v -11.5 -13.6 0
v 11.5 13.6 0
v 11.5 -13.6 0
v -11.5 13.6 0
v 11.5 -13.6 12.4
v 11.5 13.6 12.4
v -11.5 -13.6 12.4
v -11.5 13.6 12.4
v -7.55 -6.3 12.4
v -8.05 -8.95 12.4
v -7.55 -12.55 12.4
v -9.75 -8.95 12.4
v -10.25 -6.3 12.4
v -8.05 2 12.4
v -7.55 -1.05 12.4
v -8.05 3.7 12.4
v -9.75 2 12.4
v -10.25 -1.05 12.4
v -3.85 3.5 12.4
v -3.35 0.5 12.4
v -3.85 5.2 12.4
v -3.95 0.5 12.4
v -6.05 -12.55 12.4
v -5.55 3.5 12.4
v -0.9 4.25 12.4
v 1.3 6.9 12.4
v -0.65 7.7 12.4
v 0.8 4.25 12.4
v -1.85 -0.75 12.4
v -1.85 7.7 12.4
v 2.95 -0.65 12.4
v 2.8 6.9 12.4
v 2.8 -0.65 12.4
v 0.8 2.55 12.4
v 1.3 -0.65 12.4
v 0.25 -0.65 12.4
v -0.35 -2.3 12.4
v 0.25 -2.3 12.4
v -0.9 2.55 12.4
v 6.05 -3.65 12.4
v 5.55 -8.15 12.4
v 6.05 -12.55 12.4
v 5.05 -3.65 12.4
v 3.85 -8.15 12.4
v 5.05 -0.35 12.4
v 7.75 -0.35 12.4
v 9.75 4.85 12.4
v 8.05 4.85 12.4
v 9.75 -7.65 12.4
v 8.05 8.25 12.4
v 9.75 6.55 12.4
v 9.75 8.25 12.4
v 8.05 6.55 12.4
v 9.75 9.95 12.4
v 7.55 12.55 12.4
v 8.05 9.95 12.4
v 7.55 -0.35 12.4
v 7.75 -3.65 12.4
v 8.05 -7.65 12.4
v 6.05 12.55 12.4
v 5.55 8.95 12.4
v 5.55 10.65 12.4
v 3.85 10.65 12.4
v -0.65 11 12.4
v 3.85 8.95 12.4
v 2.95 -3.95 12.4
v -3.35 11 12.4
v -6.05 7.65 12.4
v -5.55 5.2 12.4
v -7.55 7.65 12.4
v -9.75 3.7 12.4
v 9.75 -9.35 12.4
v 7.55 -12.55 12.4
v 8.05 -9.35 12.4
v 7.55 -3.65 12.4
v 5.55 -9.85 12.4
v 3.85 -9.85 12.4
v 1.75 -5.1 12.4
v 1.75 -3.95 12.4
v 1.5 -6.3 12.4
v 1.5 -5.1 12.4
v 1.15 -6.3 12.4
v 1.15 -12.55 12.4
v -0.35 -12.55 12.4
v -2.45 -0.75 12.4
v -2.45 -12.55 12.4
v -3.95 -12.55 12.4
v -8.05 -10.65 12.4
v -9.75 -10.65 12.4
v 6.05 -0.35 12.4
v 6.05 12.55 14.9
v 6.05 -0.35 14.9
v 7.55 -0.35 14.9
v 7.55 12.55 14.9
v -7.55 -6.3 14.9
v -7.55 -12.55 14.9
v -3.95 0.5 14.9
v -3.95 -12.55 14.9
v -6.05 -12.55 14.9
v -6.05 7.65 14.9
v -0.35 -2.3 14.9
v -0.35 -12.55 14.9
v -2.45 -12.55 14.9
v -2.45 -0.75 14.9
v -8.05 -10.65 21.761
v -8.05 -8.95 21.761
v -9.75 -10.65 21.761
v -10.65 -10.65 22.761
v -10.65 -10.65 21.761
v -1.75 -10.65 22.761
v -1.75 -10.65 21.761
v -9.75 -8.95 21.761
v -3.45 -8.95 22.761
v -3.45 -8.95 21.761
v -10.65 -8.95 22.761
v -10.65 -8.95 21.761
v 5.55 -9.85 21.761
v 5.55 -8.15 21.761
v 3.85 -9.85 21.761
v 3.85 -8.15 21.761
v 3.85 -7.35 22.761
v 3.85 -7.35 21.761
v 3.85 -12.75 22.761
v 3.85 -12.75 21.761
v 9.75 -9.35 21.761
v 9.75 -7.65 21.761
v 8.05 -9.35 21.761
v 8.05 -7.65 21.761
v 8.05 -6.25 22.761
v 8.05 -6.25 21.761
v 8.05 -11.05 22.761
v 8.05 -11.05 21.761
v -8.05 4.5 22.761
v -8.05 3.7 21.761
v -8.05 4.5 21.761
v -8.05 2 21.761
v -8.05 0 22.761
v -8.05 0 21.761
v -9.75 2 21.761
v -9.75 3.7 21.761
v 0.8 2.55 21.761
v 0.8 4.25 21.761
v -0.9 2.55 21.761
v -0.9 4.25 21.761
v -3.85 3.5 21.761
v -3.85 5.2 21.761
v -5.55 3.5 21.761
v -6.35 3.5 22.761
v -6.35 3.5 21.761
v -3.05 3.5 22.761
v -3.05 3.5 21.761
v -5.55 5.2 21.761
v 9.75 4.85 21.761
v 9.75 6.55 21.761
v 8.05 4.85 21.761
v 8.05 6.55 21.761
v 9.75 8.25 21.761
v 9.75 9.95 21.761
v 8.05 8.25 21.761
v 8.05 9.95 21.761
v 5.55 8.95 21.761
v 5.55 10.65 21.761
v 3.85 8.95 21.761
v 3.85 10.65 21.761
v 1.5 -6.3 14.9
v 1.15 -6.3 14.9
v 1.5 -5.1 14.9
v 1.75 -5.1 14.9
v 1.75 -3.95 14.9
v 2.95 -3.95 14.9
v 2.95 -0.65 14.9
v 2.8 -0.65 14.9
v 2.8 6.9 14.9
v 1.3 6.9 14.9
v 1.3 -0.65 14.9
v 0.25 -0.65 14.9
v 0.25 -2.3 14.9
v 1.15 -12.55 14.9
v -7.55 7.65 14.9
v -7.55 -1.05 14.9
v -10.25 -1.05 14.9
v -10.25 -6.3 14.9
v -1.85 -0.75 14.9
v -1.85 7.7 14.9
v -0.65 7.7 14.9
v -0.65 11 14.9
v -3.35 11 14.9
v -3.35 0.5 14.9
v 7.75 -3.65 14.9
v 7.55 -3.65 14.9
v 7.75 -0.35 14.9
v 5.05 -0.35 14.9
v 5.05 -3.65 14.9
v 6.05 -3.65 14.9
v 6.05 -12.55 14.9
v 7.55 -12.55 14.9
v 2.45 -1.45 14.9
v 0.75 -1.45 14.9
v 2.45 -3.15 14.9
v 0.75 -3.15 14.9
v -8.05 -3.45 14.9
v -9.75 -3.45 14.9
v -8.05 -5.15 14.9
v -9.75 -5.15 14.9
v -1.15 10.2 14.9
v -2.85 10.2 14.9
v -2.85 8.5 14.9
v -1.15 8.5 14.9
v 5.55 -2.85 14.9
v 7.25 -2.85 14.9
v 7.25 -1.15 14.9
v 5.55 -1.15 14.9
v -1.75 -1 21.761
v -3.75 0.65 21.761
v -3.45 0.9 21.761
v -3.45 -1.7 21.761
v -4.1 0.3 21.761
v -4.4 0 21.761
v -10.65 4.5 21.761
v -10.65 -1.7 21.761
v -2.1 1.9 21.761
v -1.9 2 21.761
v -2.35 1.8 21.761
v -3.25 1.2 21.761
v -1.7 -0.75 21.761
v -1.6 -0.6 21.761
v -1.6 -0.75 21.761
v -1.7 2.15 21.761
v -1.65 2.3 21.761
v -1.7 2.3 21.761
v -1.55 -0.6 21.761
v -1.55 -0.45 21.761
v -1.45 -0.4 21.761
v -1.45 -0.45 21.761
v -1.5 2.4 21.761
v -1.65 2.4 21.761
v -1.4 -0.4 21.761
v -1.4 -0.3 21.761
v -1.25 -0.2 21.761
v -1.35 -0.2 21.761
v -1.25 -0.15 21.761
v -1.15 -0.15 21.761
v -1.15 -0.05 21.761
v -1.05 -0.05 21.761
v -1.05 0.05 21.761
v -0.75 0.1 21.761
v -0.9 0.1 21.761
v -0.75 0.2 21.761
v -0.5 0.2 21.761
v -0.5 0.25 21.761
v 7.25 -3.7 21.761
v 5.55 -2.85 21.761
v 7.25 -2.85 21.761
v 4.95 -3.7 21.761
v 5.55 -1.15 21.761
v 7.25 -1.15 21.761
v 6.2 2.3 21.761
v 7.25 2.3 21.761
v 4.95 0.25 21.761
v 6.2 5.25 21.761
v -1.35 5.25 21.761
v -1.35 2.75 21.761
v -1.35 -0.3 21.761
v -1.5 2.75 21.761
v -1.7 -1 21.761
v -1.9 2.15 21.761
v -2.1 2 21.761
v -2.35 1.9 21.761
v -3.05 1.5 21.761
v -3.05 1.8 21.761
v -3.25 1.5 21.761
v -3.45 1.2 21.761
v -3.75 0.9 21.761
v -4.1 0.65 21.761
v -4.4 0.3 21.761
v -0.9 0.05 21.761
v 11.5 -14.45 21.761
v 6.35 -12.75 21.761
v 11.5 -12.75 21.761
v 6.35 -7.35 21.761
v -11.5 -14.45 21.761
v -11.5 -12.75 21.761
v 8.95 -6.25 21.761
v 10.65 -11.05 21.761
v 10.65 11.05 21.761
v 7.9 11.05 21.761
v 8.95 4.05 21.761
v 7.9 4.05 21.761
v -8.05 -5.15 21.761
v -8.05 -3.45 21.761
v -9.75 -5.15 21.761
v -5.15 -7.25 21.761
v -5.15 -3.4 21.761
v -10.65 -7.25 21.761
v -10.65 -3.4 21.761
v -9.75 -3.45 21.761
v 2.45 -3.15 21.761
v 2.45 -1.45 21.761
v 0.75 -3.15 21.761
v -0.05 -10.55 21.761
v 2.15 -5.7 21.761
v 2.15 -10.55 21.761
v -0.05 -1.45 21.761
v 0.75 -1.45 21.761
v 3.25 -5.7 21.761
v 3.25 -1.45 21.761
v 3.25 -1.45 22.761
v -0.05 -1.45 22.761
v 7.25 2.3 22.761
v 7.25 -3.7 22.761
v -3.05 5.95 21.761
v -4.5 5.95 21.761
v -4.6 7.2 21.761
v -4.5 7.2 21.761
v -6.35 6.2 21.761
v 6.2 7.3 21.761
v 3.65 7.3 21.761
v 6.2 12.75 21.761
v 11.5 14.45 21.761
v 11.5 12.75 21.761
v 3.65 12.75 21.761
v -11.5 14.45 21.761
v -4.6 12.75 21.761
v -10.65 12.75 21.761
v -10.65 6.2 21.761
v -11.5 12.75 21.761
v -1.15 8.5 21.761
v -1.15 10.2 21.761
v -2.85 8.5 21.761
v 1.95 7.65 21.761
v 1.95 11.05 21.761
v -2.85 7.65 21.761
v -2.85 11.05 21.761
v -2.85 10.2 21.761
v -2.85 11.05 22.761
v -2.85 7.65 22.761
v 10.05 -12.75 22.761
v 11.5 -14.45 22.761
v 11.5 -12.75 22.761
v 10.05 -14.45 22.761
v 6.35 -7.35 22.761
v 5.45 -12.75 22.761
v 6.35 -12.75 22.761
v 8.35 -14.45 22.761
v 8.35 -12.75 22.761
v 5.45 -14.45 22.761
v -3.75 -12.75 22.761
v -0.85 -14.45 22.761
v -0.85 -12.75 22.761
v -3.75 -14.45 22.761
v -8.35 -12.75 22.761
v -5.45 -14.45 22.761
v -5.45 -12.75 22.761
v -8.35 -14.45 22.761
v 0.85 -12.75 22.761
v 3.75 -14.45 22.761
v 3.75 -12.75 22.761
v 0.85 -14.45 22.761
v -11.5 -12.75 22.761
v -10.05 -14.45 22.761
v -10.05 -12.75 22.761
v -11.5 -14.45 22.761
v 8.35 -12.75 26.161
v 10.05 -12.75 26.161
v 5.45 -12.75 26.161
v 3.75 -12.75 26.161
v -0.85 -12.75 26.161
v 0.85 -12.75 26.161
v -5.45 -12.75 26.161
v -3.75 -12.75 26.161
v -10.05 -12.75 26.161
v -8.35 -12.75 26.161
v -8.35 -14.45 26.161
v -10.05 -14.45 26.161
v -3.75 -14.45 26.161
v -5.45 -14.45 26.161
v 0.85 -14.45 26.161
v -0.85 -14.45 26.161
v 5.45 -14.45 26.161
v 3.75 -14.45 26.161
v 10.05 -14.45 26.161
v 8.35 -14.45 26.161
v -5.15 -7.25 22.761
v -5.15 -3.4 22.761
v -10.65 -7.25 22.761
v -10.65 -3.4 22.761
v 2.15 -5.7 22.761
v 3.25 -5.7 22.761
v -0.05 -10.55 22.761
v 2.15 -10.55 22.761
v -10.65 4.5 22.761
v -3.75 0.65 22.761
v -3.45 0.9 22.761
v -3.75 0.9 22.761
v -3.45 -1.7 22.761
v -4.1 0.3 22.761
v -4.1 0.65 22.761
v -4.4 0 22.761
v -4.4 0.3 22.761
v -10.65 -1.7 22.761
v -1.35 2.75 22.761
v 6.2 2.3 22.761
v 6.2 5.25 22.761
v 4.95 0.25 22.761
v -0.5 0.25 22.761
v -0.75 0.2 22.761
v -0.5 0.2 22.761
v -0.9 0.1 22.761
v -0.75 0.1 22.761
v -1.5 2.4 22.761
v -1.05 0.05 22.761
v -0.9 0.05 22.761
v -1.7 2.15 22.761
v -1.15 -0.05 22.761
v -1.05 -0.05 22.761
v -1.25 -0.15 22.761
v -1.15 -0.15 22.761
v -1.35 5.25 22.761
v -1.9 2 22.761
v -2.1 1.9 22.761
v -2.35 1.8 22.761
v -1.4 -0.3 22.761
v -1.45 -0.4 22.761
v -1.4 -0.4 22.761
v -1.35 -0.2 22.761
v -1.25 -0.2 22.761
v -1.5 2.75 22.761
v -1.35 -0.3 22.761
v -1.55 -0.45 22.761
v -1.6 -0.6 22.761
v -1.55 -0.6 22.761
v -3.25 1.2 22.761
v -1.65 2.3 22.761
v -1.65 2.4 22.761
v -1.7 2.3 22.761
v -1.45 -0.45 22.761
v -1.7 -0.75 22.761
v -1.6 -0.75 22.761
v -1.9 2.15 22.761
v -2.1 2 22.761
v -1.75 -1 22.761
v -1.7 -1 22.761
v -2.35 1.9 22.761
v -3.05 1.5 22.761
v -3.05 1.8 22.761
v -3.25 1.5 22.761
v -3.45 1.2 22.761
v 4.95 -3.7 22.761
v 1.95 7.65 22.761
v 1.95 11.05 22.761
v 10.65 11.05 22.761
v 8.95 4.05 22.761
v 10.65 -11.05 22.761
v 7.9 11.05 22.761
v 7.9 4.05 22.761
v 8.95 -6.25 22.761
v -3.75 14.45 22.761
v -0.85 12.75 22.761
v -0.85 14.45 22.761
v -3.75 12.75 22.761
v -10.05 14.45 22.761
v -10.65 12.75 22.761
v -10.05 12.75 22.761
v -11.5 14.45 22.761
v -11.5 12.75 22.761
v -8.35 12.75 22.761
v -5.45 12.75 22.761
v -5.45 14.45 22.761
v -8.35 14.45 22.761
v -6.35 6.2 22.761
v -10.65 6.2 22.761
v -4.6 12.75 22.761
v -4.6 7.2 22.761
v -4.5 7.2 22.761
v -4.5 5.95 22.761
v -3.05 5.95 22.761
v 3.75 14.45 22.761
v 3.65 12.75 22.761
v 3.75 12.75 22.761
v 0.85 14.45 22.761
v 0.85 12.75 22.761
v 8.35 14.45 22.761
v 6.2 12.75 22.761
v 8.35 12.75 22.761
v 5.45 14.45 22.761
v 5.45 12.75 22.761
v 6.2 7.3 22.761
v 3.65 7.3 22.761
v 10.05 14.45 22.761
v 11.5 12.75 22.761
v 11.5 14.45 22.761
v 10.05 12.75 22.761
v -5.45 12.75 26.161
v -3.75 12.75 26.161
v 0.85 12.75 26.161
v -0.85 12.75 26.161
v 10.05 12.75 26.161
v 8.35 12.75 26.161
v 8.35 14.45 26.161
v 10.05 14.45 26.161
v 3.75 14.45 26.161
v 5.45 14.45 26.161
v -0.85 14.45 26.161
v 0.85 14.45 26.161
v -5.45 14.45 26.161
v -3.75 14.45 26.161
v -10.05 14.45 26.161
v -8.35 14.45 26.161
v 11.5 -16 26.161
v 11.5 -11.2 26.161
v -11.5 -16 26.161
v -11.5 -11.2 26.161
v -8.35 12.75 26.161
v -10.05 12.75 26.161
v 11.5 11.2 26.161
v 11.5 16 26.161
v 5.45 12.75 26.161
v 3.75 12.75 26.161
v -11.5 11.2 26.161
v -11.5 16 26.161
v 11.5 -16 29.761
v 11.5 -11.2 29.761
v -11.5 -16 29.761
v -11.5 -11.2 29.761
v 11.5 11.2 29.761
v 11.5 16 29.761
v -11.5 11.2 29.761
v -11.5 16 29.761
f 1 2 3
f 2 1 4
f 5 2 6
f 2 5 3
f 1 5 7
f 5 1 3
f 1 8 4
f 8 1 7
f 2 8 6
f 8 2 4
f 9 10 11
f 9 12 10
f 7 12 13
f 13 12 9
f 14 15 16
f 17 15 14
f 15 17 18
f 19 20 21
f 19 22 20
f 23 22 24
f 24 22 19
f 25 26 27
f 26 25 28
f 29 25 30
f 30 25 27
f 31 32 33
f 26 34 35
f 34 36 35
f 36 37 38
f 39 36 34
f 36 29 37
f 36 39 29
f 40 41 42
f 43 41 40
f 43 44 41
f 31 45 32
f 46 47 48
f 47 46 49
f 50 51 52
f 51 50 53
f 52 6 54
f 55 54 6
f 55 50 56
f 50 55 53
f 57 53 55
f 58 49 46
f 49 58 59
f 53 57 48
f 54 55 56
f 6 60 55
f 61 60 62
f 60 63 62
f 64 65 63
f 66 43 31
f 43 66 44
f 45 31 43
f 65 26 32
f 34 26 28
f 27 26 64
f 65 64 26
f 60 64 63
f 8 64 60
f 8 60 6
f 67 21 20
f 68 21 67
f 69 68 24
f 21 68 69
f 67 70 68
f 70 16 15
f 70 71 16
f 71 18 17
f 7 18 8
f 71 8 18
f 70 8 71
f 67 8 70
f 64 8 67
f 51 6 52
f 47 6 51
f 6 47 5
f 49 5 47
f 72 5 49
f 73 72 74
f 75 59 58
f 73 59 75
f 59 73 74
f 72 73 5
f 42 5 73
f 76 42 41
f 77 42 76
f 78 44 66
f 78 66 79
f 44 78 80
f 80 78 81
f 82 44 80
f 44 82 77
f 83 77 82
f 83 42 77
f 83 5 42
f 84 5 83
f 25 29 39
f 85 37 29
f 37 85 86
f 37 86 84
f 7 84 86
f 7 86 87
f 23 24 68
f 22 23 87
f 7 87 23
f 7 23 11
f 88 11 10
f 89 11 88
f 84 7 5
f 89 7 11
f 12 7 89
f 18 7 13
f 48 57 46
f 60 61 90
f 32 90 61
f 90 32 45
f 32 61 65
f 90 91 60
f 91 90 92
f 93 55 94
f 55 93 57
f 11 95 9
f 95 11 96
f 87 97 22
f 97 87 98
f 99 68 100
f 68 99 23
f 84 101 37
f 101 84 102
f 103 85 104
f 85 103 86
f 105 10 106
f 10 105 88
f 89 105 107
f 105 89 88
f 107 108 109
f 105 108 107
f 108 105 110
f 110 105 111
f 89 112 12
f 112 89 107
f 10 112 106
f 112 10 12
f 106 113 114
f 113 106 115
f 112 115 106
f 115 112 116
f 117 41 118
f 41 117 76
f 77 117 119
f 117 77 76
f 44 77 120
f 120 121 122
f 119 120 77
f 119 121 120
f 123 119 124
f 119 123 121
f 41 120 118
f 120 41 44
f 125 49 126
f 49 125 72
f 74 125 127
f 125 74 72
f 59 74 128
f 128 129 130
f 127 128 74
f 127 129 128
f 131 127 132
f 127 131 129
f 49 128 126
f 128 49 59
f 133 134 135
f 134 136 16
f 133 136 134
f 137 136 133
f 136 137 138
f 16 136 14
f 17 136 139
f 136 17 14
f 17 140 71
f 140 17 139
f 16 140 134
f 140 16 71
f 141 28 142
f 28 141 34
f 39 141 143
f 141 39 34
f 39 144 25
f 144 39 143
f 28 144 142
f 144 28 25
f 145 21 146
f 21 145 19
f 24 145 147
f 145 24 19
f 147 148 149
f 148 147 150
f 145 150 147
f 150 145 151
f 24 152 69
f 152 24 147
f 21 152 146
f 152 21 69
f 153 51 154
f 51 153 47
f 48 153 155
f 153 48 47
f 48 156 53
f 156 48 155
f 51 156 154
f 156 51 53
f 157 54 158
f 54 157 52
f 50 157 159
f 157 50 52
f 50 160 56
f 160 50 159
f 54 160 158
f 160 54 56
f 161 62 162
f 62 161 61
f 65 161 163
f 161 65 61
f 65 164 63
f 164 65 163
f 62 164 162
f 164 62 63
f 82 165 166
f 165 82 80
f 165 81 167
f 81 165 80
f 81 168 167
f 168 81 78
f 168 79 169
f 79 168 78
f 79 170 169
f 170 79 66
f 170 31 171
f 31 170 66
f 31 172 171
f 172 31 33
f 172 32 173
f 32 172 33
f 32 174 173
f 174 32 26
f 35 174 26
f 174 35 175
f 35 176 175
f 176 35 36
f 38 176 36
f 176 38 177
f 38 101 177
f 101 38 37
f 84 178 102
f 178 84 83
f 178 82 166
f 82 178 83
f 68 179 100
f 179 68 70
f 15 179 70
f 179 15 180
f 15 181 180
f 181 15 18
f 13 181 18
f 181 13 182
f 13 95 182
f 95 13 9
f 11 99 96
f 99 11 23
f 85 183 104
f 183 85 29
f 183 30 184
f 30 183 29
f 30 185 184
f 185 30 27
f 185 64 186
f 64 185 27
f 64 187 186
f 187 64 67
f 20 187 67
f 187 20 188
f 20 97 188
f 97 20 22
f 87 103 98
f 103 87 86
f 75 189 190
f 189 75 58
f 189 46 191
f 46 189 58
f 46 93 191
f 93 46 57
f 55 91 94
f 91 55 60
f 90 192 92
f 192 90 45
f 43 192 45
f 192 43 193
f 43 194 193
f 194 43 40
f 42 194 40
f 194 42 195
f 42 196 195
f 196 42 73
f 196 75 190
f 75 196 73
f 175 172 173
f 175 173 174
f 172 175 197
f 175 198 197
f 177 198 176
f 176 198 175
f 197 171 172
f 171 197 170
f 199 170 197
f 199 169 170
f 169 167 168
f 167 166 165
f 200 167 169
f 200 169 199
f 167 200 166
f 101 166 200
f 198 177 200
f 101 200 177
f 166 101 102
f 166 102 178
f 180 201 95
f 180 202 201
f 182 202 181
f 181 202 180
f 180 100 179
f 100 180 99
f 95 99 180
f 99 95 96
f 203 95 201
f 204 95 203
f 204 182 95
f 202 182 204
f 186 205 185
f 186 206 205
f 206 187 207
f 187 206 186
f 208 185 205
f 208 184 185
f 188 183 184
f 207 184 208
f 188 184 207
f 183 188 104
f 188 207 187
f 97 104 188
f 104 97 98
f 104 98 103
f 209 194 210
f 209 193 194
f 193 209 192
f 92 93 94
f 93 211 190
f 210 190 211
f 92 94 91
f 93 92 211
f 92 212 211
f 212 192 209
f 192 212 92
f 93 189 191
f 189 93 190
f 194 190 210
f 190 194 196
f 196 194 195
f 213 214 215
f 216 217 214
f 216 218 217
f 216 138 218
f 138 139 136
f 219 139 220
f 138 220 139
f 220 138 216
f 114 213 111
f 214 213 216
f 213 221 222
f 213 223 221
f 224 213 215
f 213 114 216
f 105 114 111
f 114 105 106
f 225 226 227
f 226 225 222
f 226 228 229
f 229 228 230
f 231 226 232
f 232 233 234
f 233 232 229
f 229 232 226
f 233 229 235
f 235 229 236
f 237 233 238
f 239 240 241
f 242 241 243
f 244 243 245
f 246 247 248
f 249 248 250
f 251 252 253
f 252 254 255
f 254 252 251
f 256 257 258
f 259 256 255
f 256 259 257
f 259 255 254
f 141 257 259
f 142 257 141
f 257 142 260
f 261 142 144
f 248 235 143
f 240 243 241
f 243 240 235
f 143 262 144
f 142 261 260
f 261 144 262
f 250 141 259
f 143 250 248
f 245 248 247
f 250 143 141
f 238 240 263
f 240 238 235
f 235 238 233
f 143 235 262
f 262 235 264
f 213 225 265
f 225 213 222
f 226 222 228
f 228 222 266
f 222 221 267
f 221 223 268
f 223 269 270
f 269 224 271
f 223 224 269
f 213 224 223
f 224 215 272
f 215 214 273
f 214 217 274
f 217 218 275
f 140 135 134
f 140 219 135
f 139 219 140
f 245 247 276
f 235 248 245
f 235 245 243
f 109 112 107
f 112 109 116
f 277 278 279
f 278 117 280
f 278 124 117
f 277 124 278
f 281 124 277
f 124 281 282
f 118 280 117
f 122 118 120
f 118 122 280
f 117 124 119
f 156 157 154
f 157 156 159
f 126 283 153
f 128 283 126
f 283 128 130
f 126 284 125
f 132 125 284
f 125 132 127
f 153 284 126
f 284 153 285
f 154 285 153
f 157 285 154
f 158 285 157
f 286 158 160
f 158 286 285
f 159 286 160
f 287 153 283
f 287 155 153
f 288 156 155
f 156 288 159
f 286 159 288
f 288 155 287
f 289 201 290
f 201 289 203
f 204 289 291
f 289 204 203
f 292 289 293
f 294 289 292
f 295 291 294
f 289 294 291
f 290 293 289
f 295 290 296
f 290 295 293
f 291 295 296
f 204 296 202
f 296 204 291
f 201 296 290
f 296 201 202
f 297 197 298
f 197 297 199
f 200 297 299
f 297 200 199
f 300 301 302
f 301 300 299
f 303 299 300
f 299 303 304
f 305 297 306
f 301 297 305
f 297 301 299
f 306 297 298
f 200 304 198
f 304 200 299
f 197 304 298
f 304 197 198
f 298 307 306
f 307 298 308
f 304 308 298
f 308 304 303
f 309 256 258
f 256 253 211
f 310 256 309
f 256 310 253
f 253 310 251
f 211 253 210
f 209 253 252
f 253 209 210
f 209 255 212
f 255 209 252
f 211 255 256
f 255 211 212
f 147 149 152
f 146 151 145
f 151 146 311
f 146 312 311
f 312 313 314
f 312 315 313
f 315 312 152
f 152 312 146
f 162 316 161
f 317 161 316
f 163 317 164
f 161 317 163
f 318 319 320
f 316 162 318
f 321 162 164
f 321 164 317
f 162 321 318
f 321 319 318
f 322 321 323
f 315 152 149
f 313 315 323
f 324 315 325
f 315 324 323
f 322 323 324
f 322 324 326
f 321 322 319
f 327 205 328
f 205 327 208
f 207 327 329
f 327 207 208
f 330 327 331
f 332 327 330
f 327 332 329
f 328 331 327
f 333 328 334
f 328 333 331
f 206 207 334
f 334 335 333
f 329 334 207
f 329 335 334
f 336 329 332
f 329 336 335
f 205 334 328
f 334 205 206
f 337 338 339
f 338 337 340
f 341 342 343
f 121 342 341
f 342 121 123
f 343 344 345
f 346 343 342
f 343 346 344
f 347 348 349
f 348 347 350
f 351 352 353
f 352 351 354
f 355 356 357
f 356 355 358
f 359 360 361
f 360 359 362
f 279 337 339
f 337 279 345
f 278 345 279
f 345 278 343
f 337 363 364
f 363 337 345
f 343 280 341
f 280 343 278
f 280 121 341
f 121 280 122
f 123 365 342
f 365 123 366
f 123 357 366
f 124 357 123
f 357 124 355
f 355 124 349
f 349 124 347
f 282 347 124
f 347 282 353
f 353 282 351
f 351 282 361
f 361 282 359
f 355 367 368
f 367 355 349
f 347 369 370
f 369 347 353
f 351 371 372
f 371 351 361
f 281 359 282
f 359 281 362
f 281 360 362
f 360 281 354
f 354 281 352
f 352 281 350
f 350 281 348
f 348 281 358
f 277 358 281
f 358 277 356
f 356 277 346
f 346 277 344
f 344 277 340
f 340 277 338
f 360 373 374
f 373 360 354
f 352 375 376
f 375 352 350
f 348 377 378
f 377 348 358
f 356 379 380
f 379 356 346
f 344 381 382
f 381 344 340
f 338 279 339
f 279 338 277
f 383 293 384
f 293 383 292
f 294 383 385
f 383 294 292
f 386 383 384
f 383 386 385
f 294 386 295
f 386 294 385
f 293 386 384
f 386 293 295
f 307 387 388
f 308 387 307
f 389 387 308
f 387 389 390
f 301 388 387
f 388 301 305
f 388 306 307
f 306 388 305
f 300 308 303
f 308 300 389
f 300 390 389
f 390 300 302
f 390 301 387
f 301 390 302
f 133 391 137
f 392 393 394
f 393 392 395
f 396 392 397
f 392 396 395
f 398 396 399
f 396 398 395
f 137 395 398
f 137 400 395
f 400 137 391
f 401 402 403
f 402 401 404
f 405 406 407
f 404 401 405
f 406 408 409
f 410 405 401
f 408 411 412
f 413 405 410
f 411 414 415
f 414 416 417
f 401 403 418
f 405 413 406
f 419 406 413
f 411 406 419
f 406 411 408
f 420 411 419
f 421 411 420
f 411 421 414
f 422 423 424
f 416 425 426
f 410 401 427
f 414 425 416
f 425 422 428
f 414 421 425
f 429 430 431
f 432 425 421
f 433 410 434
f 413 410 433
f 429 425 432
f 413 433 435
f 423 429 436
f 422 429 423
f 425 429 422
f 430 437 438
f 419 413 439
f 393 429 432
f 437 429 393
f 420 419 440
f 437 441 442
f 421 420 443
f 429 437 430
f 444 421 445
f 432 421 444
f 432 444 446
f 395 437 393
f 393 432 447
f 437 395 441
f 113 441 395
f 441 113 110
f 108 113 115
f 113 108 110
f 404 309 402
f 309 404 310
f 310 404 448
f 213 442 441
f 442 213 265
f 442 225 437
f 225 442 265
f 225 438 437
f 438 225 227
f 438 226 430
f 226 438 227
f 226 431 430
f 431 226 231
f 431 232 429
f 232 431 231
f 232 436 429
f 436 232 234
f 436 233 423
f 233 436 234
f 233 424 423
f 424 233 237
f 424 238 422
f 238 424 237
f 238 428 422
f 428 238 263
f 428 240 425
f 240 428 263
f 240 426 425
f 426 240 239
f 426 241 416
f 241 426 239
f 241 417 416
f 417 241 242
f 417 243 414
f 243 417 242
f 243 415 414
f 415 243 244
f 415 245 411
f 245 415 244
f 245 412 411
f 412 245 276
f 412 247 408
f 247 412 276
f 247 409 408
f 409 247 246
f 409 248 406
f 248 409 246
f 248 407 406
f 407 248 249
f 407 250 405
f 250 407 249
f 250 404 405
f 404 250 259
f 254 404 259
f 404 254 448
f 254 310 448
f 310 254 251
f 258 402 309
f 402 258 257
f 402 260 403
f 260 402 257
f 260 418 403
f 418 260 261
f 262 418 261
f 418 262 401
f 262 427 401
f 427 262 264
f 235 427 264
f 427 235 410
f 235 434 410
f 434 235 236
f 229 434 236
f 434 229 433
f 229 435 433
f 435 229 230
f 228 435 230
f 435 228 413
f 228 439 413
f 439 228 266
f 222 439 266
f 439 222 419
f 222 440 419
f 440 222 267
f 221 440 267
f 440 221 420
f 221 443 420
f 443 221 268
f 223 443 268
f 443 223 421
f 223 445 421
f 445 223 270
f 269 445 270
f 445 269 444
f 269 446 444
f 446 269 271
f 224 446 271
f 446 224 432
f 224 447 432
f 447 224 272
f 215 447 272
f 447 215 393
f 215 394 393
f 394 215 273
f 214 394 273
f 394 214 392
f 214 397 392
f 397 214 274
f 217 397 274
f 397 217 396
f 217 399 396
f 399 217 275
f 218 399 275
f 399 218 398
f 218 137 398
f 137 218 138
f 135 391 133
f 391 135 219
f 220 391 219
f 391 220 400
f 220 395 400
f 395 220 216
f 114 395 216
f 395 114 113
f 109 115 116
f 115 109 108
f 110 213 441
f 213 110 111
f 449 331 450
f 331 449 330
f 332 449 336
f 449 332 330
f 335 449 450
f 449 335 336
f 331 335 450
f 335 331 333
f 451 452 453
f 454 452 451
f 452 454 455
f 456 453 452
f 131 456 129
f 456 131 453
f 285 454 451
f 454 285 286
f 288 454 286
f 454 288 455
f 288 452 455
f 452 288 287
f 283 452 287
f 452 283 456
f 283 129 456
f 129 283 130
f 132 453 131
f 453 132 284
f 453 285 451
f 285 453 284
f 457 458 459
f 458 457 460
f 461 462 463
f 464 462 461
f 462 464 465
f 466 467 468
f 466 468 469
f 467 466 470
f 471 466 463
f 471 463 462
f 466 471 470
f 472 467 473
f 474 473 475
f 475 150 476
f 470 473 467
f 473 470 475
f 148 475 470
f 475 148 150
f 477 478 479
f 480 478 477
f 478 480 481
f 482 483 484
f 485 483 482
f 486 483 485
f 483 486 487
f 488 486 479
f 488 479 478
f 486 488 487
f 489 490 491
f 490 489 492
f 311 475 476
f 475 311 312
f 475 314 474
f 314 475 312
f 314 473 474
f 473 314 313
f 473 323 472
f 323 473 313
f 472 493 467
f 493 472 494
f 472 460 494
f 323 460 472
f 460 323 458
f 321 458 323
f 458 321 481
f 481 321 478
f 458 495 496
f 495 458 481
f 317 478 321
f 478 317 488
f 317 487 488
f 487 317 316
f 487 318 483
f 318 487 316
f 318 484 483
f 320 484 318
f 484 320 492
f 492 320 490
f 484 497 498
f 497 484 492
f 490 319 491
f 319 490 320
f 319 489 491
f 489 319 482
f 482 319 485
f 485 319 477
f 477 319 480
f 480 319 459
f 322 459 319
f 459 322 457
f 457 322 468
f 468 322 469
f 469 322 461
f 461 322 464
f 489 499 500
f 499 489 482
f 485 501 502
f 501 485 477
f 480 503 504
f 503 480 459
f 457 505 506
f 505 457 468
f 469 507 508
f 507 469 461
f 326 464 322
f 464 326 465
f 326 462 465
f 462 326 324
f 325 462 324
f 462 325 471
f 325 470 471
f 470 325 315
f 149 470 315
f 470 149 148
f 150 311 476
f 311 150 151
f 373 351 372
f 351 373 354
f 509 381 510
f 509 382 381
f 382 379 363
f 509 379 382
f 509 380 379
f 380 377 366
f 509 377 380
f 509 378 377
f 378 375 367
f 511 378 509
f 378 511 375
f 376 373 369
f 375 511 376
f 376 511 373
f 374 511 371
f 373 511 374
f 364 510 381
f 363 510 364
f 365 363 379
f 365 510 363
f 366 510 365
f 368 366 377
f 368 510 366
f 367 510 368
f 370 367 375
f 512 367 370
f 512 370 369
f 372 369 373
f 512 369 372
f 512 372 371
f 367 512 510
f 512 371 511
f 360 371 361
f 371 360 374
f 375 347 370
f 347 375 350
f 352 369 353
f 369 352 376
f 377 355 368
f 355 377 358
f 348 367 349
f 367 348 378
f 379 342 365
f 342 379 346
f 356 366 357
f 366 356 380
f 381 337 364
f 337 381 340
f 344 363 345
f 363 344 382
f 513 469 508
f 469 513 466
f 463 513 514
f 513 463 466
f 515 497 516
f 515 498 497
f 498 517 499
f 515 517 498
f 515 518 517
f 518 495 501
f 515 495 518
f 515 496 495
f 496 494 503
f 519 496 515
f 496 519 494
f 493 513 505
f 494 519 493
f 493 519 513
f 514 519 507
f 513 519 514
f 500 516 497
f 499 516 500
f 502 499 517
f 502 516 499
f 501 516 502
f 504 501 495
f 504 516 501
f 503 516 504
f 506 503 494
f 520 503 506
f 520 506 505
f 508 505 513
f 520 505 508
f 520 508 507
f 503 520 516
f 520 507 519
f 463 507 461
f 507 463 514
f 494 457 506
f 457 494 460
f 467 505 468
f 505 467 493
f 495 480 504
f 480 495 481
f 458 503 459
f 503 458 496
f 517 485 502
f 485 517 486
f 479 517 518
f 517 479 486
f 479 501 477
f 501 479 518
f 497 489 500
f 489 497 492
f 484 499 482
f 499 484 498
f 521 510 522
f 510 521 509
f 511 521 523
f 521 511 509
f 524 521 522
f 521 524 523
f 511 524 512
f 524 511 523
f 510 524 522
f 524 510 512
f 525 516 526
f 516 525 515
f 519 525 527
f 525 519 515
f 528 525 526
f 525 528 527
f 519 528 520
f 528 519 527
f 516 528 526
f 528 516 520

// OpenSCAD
// Generated by SolidPython 0.4.2 on 2020-09-29 23:20:07
//!OpenSCAD

scale(v = 0.0100000000) {
	translate(v = [-1150, -1360, 0]) {
		union() {
			color(c = [0.4000000000, 0.4000000000, 0.4000000000]) {
				translate(v = [0, 0, 0]) {
					linear_extrude(height = 1000.0000000000) {
						polygon(paths = [[0, 1, 2, 3]], points = [[0, 0], [0, 2720], [2300, 2720], [2300, 0]]);
					}
				}
			}
			color(c = [0.2000000000, 0.6000000000, 0.2000000000]) {
				translate(v = [0, 0, 1000.0000000000]) {
					linear_extrude(height = 120.0000000000) {
						polygon(paths = [[0, 1, 2, 3]], points = [[0, 1305], [0, 2720], [2300, 2720], [2300, 1305]]);
					}
				}
			}
			color(c = [0.4000000000, 0.4000000000, 0.4000000000]) {
				translate(v = [0, 0, 1000.0000000000]) {
					linear_extrude(height = 120.0000000000) {
						polygon(paths = [[0, 1, 2, 3]], points = [[0, 0], [0, 1305], [2300, 1305], [2300, 0]]);
					}
				}
			}
			color(c = [0.9000000000, 0.6000000000, 0.6000000000]) {
				translate(v = [0, 0, 1120.0000000000]) {
					linear_extrude(height = 120.0000000000) {
						polygon(paths = [[0, 1, 2, 3]], points = [[135, 1500], [135, 1920], [395, 1920], [395, 1500]]);
					}
				}
			}
			color(c = [0.9000000000, 0.6000000000, 0.6000000000]) {
				translate(v = [0, 0, 1120.0000000000]) {
					linear_extrude(height = 120.0000000000) {
						polygon(paths = [[0, 1, 2, 3]], points = [[545, 1500], [545, 1920], [815, 1920], [815, 1500]]);
					}
				}
			}
			color(c = [0.9000000000, 0.6000000000, 0.6000000000]) {
				translate(v = [0, 0, 1120.0000000000]) {
					linear_extrude(height = 120.0000000000) {
						polygon(paths = [[0, 1, 2, 3]], points = [[965, 1500], [965, 1920], [1280, 1920], [1280, 1500]]);
					}
				}
			}
			color(c = [0.9000000000, 0.6000000000, 0.6000000000]) {
				translate(v = [0, 0, 1120.0000000000]) {
					linear_extrude(height = 120.0000000000) {
						polygon(paths = [[0, 1, 2, 3, 4, 5, 6, 7, 8, 9]], points = [[1505, 1485], [1505, 1500], [1430, 1500], [1430, 1920], [1505, 1920], [1505, 2190], [1495, 2190], [1495, 2485], [1755, 2485], [1755, 1485]]);
					}
				}
			}
			color(c = [0.9000000000, 0.6000000000, 0.6000000000]) {
				translate(v = [0, 0, 1120.0000000000]) {
					linear_extrude(height = 120.0000000000) {
						polygon(paths = [[0, 1, 2, 3]], points = [[1905, 1485], [1905, 2485], [2165, 2485], [2165, 1485]]);
					}
				}
			}
			color(c = [0.9000000000, 0.6000000000, 0.9000000000]) {
				translate(v = [0, 0, 1120.0000000000]) {
					linear_extrude(height = 120.0000000000) {
						polygon(paths = [[0, 1, 2, 3]], points = [[135, 235], [135, 655], [395, 655], [395, 235]]);
					}
				}
			}
			color(c = [0.9000000000, 0.6000000000, 0.9000000000]) {
				translate(v = [0, 0, 1120.0000000000]) {
					linear_extrude(height = 120.0000000000) {
						polygon(paths = [[0, 1, 2, 3]], points = [[545, 235], [545, 655], [755, 655], [755, 235]]);
					}
				}
			}
			color(c = [0.9000000000, 0.6000000000, 0.9000000000]) {
				translate(v = [0, 0, 1120.0000000000]) {
					linear_extrude(height = 120.0000000000) {
						polygon(paths = [[0, 1, 2, 3]], points = [[905, 235], [905, 655], [1115, 655], [1115, 235]]);
					}
				}
			}
			color(c = [0.9000000000, 0.6000000000, 0.9000000000]) {
				translate(v = [0, 0, 1120.0000000000]) {
					linear_extrude(height = 120.0000000000) {
						polygon(paths = [[0, 1, 2, 3, 4, 5]], points = [[1265, 235], [1265, 655], [1505, 655], [1505, 885], [1755, 885], [1755, 235]]);
					}
				}
			}
			color(c = [0.9000000000, 0.6000000000, 0.9000000000]) {
				translate(v = [0, 0, 1120.0000000000]) {
					linear_extrude(height = 120.0000000000) {
						polygon(paths = [[0, 1, 2, 3]], points = [[1905, 235], [1905, 885], [2165, 885], [2165, 235]]);
					}
				}
			}
			color(c = [0.2000000000, 0.6000000000, 0.2000000000]) {
				translate(v = [0, 0, 1120.0000000000]) {
					linear_extrude(height = 120.0000000000) {
						difference() {
							polygon(paths = [[0, 1, 2, 3]], points = [[0, 1305], [0, 2720], [2300, 2720], [2300, 1305]]);
							polygon(paths = [[0, 1, 2, 3]], points = [[1905, 1485], [2165, 1485], [2165, 2485], [1905, 2485]]);
							polygon(paths = [[0, 1, 2, 3]], points = [[135, 1500], [395, 1500], [395, 1920], [135, 1920]]);
							polygon(paths = [[0, 1, 2, 3]], points = [[545, 1500], [815, 1500], [815, 1920], [545, 1920]]);
							polygon(paths = [[0, 1, 2, 3]], points = [[965, 1500], [1280, 1500], [1280, 1920], [965, 1920]]);
							polygon(paths = [[0, 1, 2, 3, 4, 5, 6, 7, 8, 9]], points = [[1505, 1485], [1755, 1485], [1755, 2485], [1495, 2485], [1495, 2190], [1505, 2190], [1505, 1920], [1430, 1920], [1430, 1500], [1505, 1500]]);
						}
					}
				}
			}
			color(c = [0.4000000000, 0.4000000000, 0.4000000000]) {
				translate(v = [0, 0, 1120.0000000000]) {
					linear_extrude(height = 120.0000000000) {
						difference() {
							polygon(paths = [[0, 1, 2, 3]], points = [[0, 0], [0, 1305], [2300, 1305], [2300, 0]]);
							polygon(paths = [[0, 1, 2, 3]], points = [[135, 235], [395, 235], [395, 655], [135, 655]]);
							polygon(paths = [[0, 1, 2, 3]], points = [[545, 235], [755, 235], [755, 655], [545, 655]]);
							polygon(paths = [[0, 1, 2, 3]], points = [[905, 235], [1115, 235], [1115, 655], [905, 655]]);
							polygon(paths = [[0, 1, 2, 3]], points = [[1905, 235], [2165, 235], [2165, 885], [1905, 885]]);
							polygon(paths = [[0, 1, 2, 3, 4, 5]], points = [[1265, 235], [1755, 235], [1755, 885], [1505, 885], [1505, 655], [1265, 655]]);
						}
					}
				}
			}
			color(c = [0.1000000000, 0.1000000000, 0.1000000000]) {
				translate(v = [0, 0, 1240.0000000000]) {
					linear_extrude(height = 70.0000000000) {
						polygon(paths = [[0, 1, 2, 3]], points = [[175, 295], [175, 465], [345, 465], [345, 295]]);
					}
				}
			}
			color(c = [0.1000000000, 0.1000000000, 0.1000000000]) {
				translate(v = [0, 0, 1240.0000000000]) {
					linear_extrude(height = 70.0000000000) {
						polygon(paths = [[0, 1, 2, 3]], points = [[1535, 375], [1535, 545], [1705, 545], [1705, 375]]);
					}
				}
			}
			color(c = [0.1000000000, 0.1000000000, 0.1000000000]) {
				translate(v = [0, 0, 1240.0000000000]) {
					linear_extrude(height = 70.0000000000) {
						polygon(paths = [[0, 1, 2, 3]], points = [[1955, 425], [1955, 595], [2125, 595], [2125, 425]]);
					}
				}
			}
			color(c = [0.1000000000, 0.1000000000, 0.1000000000]) {
				translate(v = [0, 0, 1240.0000000000]) {
					linear_extrude(height = 70.0000000000) {
						polygon(paths = [[0, 1, 2, 3]], points = [[175, 1560], [175, 1730], [345, 1730], [345, 1560]]);
					}
				}
			}
			color(c = [0.1000000000, 0.1000000000, 0.1000000000]) {
				translate(v = [0, 0, 1240.0000000000]) {
					linear_extrude(height = 70.0000000000) {
						polygon(paths = [[0, 1, 2, 3]], points = [[1060, 1615], [1060, 1785], [1230, 1785], [1230, 1615]]);
					}
				}
			}
			color(c = [0.1000000000, 0.1000000000, 0.1000000000]) {
				translate(v = [0, 0, 1240.0000000000]) {
					linear_extrude(height = 70.0000000000) {
						polygon(paths = [[0, 1, 2, 3]], points = [[595, 1710], [595, 1880], [765, 1880], [765, 1710]]);
					}
				}
			}
			color(c = [0.1000000000, 0.1000000000, 0.1000000000]) {
				translate(v = [0, 0, 1240.0000000000]) {
					linear_extrude(height = 70.0000000000) {
						polygon(paths = [[0, 1, 2, 3]], points = [[1955, 1845], [1955, 2015], [2125, 2015], [2125, 1845]]);
					}
				}
			}
			color(c = [0.1000000000, 0.1000000000, 0.1000000000]) {
				translate(v = [0, 0, 1240.0000000000]) {
					linear_extrude(height = 70.0000000000) {
						polygon(paths = [[0, 1, 2, 3]], points = [[1955, 2185], [1955, 2355], [2125, 2355], [2125, 2185]]);
					}
				}
			}
			color(c = [0.1000000000, 0.1000000000, 0.1000000000]) {
				translate(v = [0, 0, 1240.0000000000]) {
					linear_extrude(height = 70.0000000000) {
						polygon(paths = [[0, 1, 2, 3]], points = [[1535, 2255], [1535, 2425], [1705, 2425], [1705, 2255]]);
					}
				}
			}
			color(c = [1.0000000000, 1.0000000000, 1.0000000000]) {
				translate(v = [0, 0, 1240.0000000000]) {
					linear_extrude(height = 70.0000000000) {
						polygon(paths = [[0, 1, 2, 3, 4, 5, 6, 7, 8, 9, 10, 11, 12, 13, 14, 15]], points = [[1115, 105], [1115, 1130], [1175, 1130], [1175, 1295], [1280, 1295], [1280, 2050], [1430, 2050], [1430, 1295], [1445, 1295], [1445, 965], [1325, 965], [1325, 850], [1300, 850], [1300, 730], [1265, 730], [1265, 105]]);
					}
				}
			}
			color(c = [1.0000000000, 1.0000000000, 1.0000000000]) {
				translate(v = [0, 0, 1240.0000000000]) {
					linear_extrude(height = 70.0000000000) {
						polygon(paths = [[0, 1, 2, 3, 4, 5, 6, 7]], points = [[395, 105], [395, 730], [125, 730], [125, 1255], [395, 1255], [395, 2125], [545, 2125], [545, 105]]);
					}
				}
			}
			color(c = [1.0000000000, 1.0000000000, 1.0000000000]) {
				translate(v = [0, 0, 1240.0000000000]) {
					linear_extrude(height = 70.0000000000) {
						polygon(paths = [[0, 1, 2, 3, 4, 5, 6, 7, 8, 9]], points = [[755, 105], [755, 1410], [815, 1410], [815, 2460], [1085, 2460], [1085, 2130], [965, 2130], [965, 1285], [905, 1285], [905, 105]]);
					}
				}
			}
			color(c = [1.0000000000, 1.0000000000, 1.0000000000]) {
				translate(v = [0, 0, 1240.0000000000]) {
					linear_extrude(height = 70.0000000000) {
						polygon(paths = [[0, 1, 2, 3, 4, 5, 6, 7, 8, 9, 10, 11]], points = [[1755, 105], [1755, 995], [1655, 995], [1655, 1325], [1755, 1325], [1755, 2615], [1905, 2615], [1905, 1325], [1925, 1325], [1925, 995], [1905, 995], [1905, 105]]);
					}
				}
			}
			color(c = [0.1000000000, 0.1000000000, 0.1000000000]) {
				translate(v = [0, 0, 1310.0000000000]) {
					linear_extrude(height = 180.0000000000) {
						polygon(paths = [[0, 1, 2, 3]], points = [[175, 295], [175, 465], [345, 465], [345, 295]]);
					}
				}
			}
			color(c = [0.1000000000, 0.1000000000, 0.1000000000]) {
				translate(v = [0, 0, 1310.0000000000]) {
					linear_extrude(height = 180.0000000000) {
						polygon(paths = [[0, 1, 2, 3]], points = [[1535, 375], [1535, 545], [1705, 545], [1705, 375]]);
					}
				}
			}
			color(c = [0.1000000000, 0.1000000000, 0.1000000000]) {
				translate(v = [0, 0, 1310.0000000000]) {
					linear_extrude(height = 180.0000000000) {
						polygon(paths = [[0, 1, 2, 3]], points = [[1955, 425], [1955, 595], [2125, 595], [2125, 425]]);
					}
				}
			}
			color(c = [0.1000000000, 0.1000000000, 0.1000000000]) {
				translate(v = [0, 0, 1310.0000000000]) {
					linear_extrude(height = 180.0000000000) {
						polygon(paths = [[0, 1, 2, 3]], points = [[175, 1560], [175, 1730], [345, 1730], [345, 1560]]);
					}
				}
			}
			color(c = [0.1000000000, 0.1000000000, 0.1000000000]) {
				translate(v = [0, 0, 1310.0000000000]) {
					linear_extrude(height = 180.0000000000) {
						polygon(paths = [[0, 1, 2, 3]], points = [[1060, 1615], [1060, 1785], [1230, 1785], [1230, 1615]]);
					}
				}
			}
			color(c = [0.1000000000, 0.1000000000, 0.1000000000]) {
				translate(v = [0, 0, 1310.0000000000]) {
					linear_extrude(height = 180.0000000000) {
						polygon(paths = [[0, 1, 2, 3]], points = [[595, 1710], [595, 1880], [765, 1880], [765, 1710]]);
					}
				}
			}
			color(c = [0.1000000000, 0.1000000000, 0.1000000000]) {
				translate(v = [0, 0, 1310.0000000000]) {
					linear_extrude(height = 180.0000000000) {
						polygon(paths = [[0, 1, 2, 3]], points = [[1955, 1845], [1955, 2015], [2125, 2015], [2125, 1845]]);
					}
				}
			}
			color(c = [0.1000000000, 0.1000000000, 0.1000000000]) {
				translate(v = [0, 0, 1310.0000000000]) {
					linear_extrude(height = 180.0000000000) {
						polygon(paths = [[0, 1, 2, 3]], points = [[1955, 2185], [1955, 2355], [2125, 2355], [2125, 2185]]);
					}
				}
			}
			color(c = [0.1000000000, 0.1000000000, 0.1000000000]) {
				translate(v = [0, 0, 1310.0000000000]) {
					linear_extrude(height = 180.0000000000) {
						polygon(paths = [[0, 1, 2, 3]], points = [[1535, 2255], [1535, 2425], [1705, 2425], [1705, 2255]]);
					}
				}
			}
			color(c = [0.7000000000, 0, 0]) {
				translate(v = [0, 0, 1310.0000000000]) {
					linear_extrude(height = 180.0000000000) {
						polygon(paths = [[0, 1, 2, 3, 4, 5, 6, 7, 8, 9, 10, 11, 12, 13, 14, 15]], points = [[1115, 105], [1115, 1130], [1175, 1130], [1175, 1295], [1280, 1295], [1280, 2050], [1430, 2050], [1430, 1295], [1445, 1295], [1445, 965], [1325, 965], [1325, 850], [1300, 850], [1300, 730], [1265, 730], [1265, 105]]);
					}
				}
			}
			color(c = [0.7000000000, 0, 0]) {
				translate(v = [0, 0, 1310.0000000000]) {
					linear_extrude(height = 180.0000000000) {
						polygon(paths = [[0, 1, 2, 3, 4, 5, 6, 7]], points = [[395, 105], [395, 730], [125, 730], [125, 1255], [395, 1255], [395, 2125], [545, 2125], [545, 105]]);
					}
				}
			}
			color(c = [0.7000000000, 0, 0]) {
				translate(v = [0, 0, 1310.0000000000]) {
					linear_extrude(height = 180.0000000000) {
						polygon(paths = [[0, 1, 2, 3, 4, 5, 6, 7, 8, 9]], points = [[755, 105], [755, 1410], [815, 1410], [815, 2460], [1085, 2460], [1085, 2130], [965, 2130], [965, 1285], [905, 1285], [905, 105]]);
					}
				}
			}
			color(c = [0.7000000000, 0, 0]) {
				translate(v = [0, 0, 1310.0000000000]) {
					linear_extrude(height = 180.0000000000) {
						polygon(paths = [[0, 1, 2, 3, 4, 5, 6, 7, 8, 9, 10, 11]], points = [[1755, 105], [1755, 995], [1655, 995], [1655, 1325], [1755, 1325], [1755, 2615], [1905, 2615], [1905, 1325], [1925, 1325], [1925, 995], [1905, 995], [1905, 105]]);
					}
				}
			}
			color(c = [0.1000000000, 0.1000000000, 0.1000000000]) {
				translate(v = [0, 0, 1490.0000000000]) {
					linear_extrude(height = 686.1000000000) {
						polygon(paths = [[0, 1, 2, 3]], points = [[175, 295], [175, 465], [345, 465], [345, 295]]);
					}
				}
			}
			color(c = [0.1000000000, 0.1000000000, 0.1000000000]) {
				translate(v = [0, 0, 1490.0000000000]) {
					linear_extrude(height = 686.1000000000) {
						polygon(paths = [[0, 1, 2, 3]], points = [[1535, 375], [1535, 545], [1705, 545], [1705, 375]]);
					}
				}
			}
			color(c = [0.1000000000, 0.1000000000, 0.1000000000]) {
				translate(v = [0, 0, 1490.0000000000]) {
					linear_extrude(height = 686.1000000000) {
						polygon(paths = [[0, 1, 2, 3]], points = [[1955, 425], [1955, 595], [2125, 595], [2125, 425]]);
					}
				}
			}
			color(c = [0.1000000000, 0.1000000000, 0.1000000000]) {
				translate(v = [0, 0, 1490.0000000000]) {
					linear_extrude(height = 686.1000000000) {
						polygon(paths = [[0, 1, 2, 3]], points = [[175, 845], [175, 1015], [345, 1015], [345, 845]]);
					}
				}
			}
			color(c = [0.1000000000, 0.1000000000, 0.1000000000]) {
				translate(v = [0, 0, 1490.0000000000]) {
					linear_extrude(height = 686.1000000000) {
						polygon(paths = [[0, 1, 2, 3]], points = [[1225, 1045], [1225, 1215], [1395, 1215], [1395, 1045]]);
					}
				}
			}
			color(c = [0.1000000000, 0.1000000000, 0.1000000000]) {
				translate(v = [0, 0, 1490.0000000000]) {
					linear_extrude(height = 686.1000000000) {
						polygon(paths = [[0, 1, 2, 3]], points = [[1705, 1075], [1705, 1245], [1875, 1245], [1875, 1075]]);
					}
				}
			}
			color(c = [0.1000000000, 0.1000000000, 0.1000000000]) {
				translate(v = [0, 0, 1490.0000000000]) {
					linear_extrude(height = 686.1000000000) {
						polygon(paths = [[0, 1, 2, 3]], points = [[175, 1560], [175, 1730], [345, 1730], [345, 1560]]);
					}
				}
			}
			color(c = [0.1000000000, 0.1000000000, 0.1000000000]) {
				translate(v = [0, 0, 1490.0000000000]) {
					linear_extrude(height = 686.1000000000) {
						polygon(paths = [[0, 1, 2, 3]], points = [[1060, 1615], [1060, 1785], [1230, 1785], [1230, 1615]]);
					}
				}
			}
			color(c = [0.1000000000, 0.1000000000, 0.1000000000]) {
				translate(v = [0, 0, 1490.0000000000]) {
					linear_extrude(height = 686.1000000000) {
						polygon(paths = [[0, 1, 2, 3]], points = [[595, 1710], [595, 1880], [765, 1880], [765, 1710]]);
					}
				}
			}
			color(c = [0.1000000000, 0.1000000000, 0.1000000000]) {
				translate(v = [0, 0, 1490.0000000000]) {
					linear_extrude(height = 686.1000000000) {
						polygon(paths = [[0, 1, 2, 3]], points = [[1955, 1845], [1955, 2015], [2125, 2015], [2125, 1845]]);
					}
				}
			}
			color(c = [0.1000000000, 0.1000000000, 0.1000000000]) {
				translate(v = [0, 0, 1490.0000000000]) {
					linear_extrude(height = 686.1000000000) {
						polygon(paths = [[0, 1, 2, 3]], points = [[1955, 2185], [1955, 2355], [2125, 2355], [2125, 2185]]);
					}
				}
			}
			color(c = [0.1000000000, 0.1000000000, 0.1000000000]) {
				translate(v = [0, 0, 1490.0000000000]) {
					linear_extrude(height = 686.1000000000) {
						polygon(paths = [[0, 1, 2, 3]], points = [[865, 2210], [865, 2380], [1035, 2380], [1035, 2210]]);
					}
				}
			}
			color(c = [0.1000000000, 0.1000000000, 0.1000000000]) {
				translate(v = [0, 0, 1490.0000000000]) {
					linear_extrude(height = 686.1000000000) {
						polygon(paths = [[0, 1, 2, 3]], points = [[1535, 2255], [1535, 2425], [1705, 2425], [1705, 2255]]);
					}
				}
			}
			color(c = [0.9000000000, 0.6000000000, 0.6000000000]) {
				translate(v = [0, 0, 2176.1000000000]) {
					linear_extrude(height = 100.0000000000) {
						polygon(paths = [[0, 1, 2, 3, 4, 5, 6, 7]], points = [[0, -85], [0, 85], [1535, 85], [1535, 625], [1785, 625], [1785, 85], [2300, 85], [2300, -85]]);
					}
				}
			}
			color(c = [0.9000000000, 0.6000000000, 0.6000000000]) {
				translate(v = [0, 0, 2176.1000000000]) {
					linear_extrude(height = 100.0000000000) {
						polygon(paths = [[0, 1, 2, 3]], points = [[85, 635], [85, 1020], [635, 1020], [635, 635]]);
					}
				}
			}
			color(c = [0.9000000000, 0.6000000000, 0.6000000000]) {
				translate(v = [0, 0, 2176.1000000000]) {
					linear_extrude(height = 100.0000000000) {
						polygon(paths = [[0, 1, 2, 3, 4, 5]], points = [[1145, 305], [1145, 1215], [1475, 1215], [1475, 790], [1365, 790], [1365, 305]]);
					}
				}
			}
			color(c = [0.9000000000, 0.6000000000, 0.6000000000]) {
				translate(v = [0, 0, 2176.1000000000]) {
					linear_extrude(height = 100.0000000000) {
						polygon(paths = [[0, 1, 2, 3, 4, 5, 6, 7, 8, 9, 10, 11, 12, 13, 14, 15, 16, 17, 18, 19, 20, 21, 22, 23, 24, 25, 26, 27, 28, 29, 30, 31, 32, 33, 34, 35, 36, 37, 38, 39, 40, 41, 42, 43, 44, 45, 46, 47, 48, 49, 50, 51, 52, 53, 54, 55, 56, 57, 58, 59, 60, 61, 62, 63, 64, 65]], points = [[85, 295], [85, 465], [805, 465], [805, 1190], [85, 1190], [85, 1810], [345, 1810], [345, 1360], [710, 1360], [710, 1390], [740, 1390], [740, 1425], [775, 1425], [775, 1450], [805, 1450], [805, 1480], [825, 1480], [825, 1510], [845, 1510], [845, 1540], [915, 1540], [915, 1550], [940, 1550], [940, 1560], [960, 1560], [960, 1575], [980, 1575], [980, 1590], [985, 1590], [985, 1600], [1000, 1600], [1000, 1635], [1015, 1635], [1015, 1885], [1770, 1885], [1770, 1590], [1875, 1590], [1875, 990], [1645, 990], [1645, 1385], [1100, 1385], [1100, 1380], [1075, 1380], [1075, 1370], [1060, 1370], [1060, 1365], [1045, 1365], [1045, 1355], [1035, 1355], [1035, 1345], [1025, 1345], [1025, 1340], [1015, 1340], [1015, 1330], [1010, 1330], [1010, 1320], [1005, 1320], [1005, 1315], [995, 1315], [995, 1300], [990, 1300], [990, 1285], [980, 1285], [980, 1260], [975, 1260], [975, 295]]);
					}
				}
			}
			color(c = [0.9000000000, 0.6000000000, 0.6000000000]) {
				translate(v = [0, 0, 2176.1000000000]) {
					linear_extrude(height = 100.0000000000) {
						polygon(paths = [[0, 1, 2, 3]], points = [[865, 2125], [865, 2465], [1345, 2465], [1345, 2125]]);
					}
				}
			}
			color(c = [0.9000000000, 0.6000000000, 0.6000000000]) {
				translate(v = [0, 0, 2176.1000000000]) {
					linear_extrude(height = 100.0000000000) {
						polygon(paths = [[0, 1, 2, 3, 4, 5, 6, 7]], points = [[1955, 255], [1955, 735], [2045, 735], [2045, 1765], [1940, 1765], [1940, 2465], [2215, 2465], [2215, 255]]);
					}
				}
			}
			color(c = [0.9000000000, 0.6000000000, 0.6000000000]) {
				translate(v = [0, 0, 2176.1000000000]) {
					linear_extrude(height = 100.0000000000) {
						polygon(paths = [[0, 1, 2, 3, 4, 5, 6, 7, 8, 9, 10, 11, 12, 13, 14, 15, 16, 17]], points = [[515, 1710], [515, 1980], [85, 1980], [85, 2635], [0, 2635], [0, 2805], [2300, 2805], [2300, 2635], [1770, 2635], [1770, 2090], [1515, 2090], [1515, 2635], [690, 2635], [690, 2080], [700, 2080], [700, 1955], [845, 1955], [845, 1710]]);
					}
				}
			}
			color(c = [0.5000000000, 0.5000000000, 0.5000000000]) {
				translate(v = [0, 0, 2276.1000000000]) {
					linear_extrude(height = 340.0000000000) {
						polygon(paths = [[0, 1, 2, 3]], points = [[145, -85], [145, 85], [315, 85], [315, -85]]);
					}
				}
			}
			color(c = [0.5000000000, 0.5000000000, 0.5000000000]) {
				translate(v = [0, 0, 2276.1000000000]) {
					linear_extrude(height = 340.0000000000) {
						polygon(paths = [[0, 1, 2, 3]], points = [[605, -85], [605, 85], [775, 85], [775, -85]]);
					}
				}
			}
			color(c = [0.5000000000, 0.5000000000, 0.5000000000]) {
				translate(v = [0, 0, 2276.1000000000]) {
					linear_extrude(height = 340.0000000000) {
						polygon(paths = [[0, 1, 2, 3]], points = [[1065, -85], [1065, 85], [1235, 85], [1235, -85]]);
					}
				}
			}
			color(c = [0.5000000000, 0.5000000000, 0.5000000000]) {
				translate(v = [0, 0, 2276.1000000000]) {
					linear_extrude(height = 340.0000000000) {
						polygon(paths = [[0, 1, 2, 3]], points = [[1525, -85], [1525, 85], [1695, 85], [1695, -85]]);
					}
				}
			}
			color(c = [0.5000000000, 0.5000000000, 0.5000000000]) {
				translate(v = [0, 0, 2276.1000000000]) {
					linear_extrude(height = 340.0000000000) {
						polygon(paths = [[0, 1, 2, 3]], points = [[1985, -85], [1985, 85], [2155, 85], [2155, -85]]);
					}
				}
			}
			color(c = [0.5000000000, 0.5000000000, 0.5000000000]) {
				translate(v = [0, 0, 2276.1000000000]) {
					linear_extrude(height = 340.0000000000) {
						polygon(paths = [[0, 1, 2, 3]], points = [[145, 2635], [145, 2805], [315, 2805], [315, 2635]]);
					}
				}
			}
			color(c = [0.5000000000, 0.5000000000, 0.5000000000]) {
				translate(v = [0, 0, 2276.1000000000]) {
					linear_extrude(height = 340.0000000000) {
						polygon(paths = [[0, 1, 2, 3]], points = [[605, 2635], [605, 2805], [775, 2805], [775, 2635]]);
					}
				}
			}
			color(c = [0.5000000000, 0.5000000000, 0.5000000000]) {
				translate(v = [0, 0, 2276.1000000000]) {
					linear_extrude(height = 340.0000000000) {
						polygon(paths = [[0, 1, 2, 3]], points = [[1065, 2635], [1065, 2805], [1235, 2805], [1235, 2635]]);
					}
				}
			}
			color(c = [0.5000000000, 0.5000000000, 0.5000000000]) {
				translate(v = [0, 0, 2276.1000000000]) {
					linear_extrude(height = 340.0000000000) {
						polygon(paths = [[0, 1, 2, 3]], points = [[1525, 2635], [1525, 2805], [1695, 2805], [1695, 2635]]);
					}
				}
			}
			color(c = [0.5000000000, 0.5000000000, 0.5000000000]) {
				translate(v = [0, 0, 2276.1000000000]) {
					linear_extrude(height = 340.0000000000) {
						polygon(paths = [[0, 1, 2, 3]], points = [[1985, 2635], [1985, 2805], [2155, 2805], [2155, 2635]]);
					}
				}
			}
			color(c = [0.3000000000, 0.3000000000, 1]) {
				translate(v = [0, 0, 2616.1000000000]) {
					linear_extrude(height = 360.0000000000) {
						polygon(paths = [[0, 1, 2, 3]], points = [[0, -240], [0, 240], [2300, 240], [2300, -240]]);
					}
				}
			}
			color(c = [0.3000000000, 0.3000000000, 1]) {
				translate(v = [0, 0, 2616.1000000000]) {
					linear_extrude(height = 360.0000000000) {
						polygon(paths = [[0, 1, 2, 3]], points = [[0, 2480], [0, 2960], [2300, 2960], [2300, 2480]]);
					}
				}
			}
		}
	}
}
